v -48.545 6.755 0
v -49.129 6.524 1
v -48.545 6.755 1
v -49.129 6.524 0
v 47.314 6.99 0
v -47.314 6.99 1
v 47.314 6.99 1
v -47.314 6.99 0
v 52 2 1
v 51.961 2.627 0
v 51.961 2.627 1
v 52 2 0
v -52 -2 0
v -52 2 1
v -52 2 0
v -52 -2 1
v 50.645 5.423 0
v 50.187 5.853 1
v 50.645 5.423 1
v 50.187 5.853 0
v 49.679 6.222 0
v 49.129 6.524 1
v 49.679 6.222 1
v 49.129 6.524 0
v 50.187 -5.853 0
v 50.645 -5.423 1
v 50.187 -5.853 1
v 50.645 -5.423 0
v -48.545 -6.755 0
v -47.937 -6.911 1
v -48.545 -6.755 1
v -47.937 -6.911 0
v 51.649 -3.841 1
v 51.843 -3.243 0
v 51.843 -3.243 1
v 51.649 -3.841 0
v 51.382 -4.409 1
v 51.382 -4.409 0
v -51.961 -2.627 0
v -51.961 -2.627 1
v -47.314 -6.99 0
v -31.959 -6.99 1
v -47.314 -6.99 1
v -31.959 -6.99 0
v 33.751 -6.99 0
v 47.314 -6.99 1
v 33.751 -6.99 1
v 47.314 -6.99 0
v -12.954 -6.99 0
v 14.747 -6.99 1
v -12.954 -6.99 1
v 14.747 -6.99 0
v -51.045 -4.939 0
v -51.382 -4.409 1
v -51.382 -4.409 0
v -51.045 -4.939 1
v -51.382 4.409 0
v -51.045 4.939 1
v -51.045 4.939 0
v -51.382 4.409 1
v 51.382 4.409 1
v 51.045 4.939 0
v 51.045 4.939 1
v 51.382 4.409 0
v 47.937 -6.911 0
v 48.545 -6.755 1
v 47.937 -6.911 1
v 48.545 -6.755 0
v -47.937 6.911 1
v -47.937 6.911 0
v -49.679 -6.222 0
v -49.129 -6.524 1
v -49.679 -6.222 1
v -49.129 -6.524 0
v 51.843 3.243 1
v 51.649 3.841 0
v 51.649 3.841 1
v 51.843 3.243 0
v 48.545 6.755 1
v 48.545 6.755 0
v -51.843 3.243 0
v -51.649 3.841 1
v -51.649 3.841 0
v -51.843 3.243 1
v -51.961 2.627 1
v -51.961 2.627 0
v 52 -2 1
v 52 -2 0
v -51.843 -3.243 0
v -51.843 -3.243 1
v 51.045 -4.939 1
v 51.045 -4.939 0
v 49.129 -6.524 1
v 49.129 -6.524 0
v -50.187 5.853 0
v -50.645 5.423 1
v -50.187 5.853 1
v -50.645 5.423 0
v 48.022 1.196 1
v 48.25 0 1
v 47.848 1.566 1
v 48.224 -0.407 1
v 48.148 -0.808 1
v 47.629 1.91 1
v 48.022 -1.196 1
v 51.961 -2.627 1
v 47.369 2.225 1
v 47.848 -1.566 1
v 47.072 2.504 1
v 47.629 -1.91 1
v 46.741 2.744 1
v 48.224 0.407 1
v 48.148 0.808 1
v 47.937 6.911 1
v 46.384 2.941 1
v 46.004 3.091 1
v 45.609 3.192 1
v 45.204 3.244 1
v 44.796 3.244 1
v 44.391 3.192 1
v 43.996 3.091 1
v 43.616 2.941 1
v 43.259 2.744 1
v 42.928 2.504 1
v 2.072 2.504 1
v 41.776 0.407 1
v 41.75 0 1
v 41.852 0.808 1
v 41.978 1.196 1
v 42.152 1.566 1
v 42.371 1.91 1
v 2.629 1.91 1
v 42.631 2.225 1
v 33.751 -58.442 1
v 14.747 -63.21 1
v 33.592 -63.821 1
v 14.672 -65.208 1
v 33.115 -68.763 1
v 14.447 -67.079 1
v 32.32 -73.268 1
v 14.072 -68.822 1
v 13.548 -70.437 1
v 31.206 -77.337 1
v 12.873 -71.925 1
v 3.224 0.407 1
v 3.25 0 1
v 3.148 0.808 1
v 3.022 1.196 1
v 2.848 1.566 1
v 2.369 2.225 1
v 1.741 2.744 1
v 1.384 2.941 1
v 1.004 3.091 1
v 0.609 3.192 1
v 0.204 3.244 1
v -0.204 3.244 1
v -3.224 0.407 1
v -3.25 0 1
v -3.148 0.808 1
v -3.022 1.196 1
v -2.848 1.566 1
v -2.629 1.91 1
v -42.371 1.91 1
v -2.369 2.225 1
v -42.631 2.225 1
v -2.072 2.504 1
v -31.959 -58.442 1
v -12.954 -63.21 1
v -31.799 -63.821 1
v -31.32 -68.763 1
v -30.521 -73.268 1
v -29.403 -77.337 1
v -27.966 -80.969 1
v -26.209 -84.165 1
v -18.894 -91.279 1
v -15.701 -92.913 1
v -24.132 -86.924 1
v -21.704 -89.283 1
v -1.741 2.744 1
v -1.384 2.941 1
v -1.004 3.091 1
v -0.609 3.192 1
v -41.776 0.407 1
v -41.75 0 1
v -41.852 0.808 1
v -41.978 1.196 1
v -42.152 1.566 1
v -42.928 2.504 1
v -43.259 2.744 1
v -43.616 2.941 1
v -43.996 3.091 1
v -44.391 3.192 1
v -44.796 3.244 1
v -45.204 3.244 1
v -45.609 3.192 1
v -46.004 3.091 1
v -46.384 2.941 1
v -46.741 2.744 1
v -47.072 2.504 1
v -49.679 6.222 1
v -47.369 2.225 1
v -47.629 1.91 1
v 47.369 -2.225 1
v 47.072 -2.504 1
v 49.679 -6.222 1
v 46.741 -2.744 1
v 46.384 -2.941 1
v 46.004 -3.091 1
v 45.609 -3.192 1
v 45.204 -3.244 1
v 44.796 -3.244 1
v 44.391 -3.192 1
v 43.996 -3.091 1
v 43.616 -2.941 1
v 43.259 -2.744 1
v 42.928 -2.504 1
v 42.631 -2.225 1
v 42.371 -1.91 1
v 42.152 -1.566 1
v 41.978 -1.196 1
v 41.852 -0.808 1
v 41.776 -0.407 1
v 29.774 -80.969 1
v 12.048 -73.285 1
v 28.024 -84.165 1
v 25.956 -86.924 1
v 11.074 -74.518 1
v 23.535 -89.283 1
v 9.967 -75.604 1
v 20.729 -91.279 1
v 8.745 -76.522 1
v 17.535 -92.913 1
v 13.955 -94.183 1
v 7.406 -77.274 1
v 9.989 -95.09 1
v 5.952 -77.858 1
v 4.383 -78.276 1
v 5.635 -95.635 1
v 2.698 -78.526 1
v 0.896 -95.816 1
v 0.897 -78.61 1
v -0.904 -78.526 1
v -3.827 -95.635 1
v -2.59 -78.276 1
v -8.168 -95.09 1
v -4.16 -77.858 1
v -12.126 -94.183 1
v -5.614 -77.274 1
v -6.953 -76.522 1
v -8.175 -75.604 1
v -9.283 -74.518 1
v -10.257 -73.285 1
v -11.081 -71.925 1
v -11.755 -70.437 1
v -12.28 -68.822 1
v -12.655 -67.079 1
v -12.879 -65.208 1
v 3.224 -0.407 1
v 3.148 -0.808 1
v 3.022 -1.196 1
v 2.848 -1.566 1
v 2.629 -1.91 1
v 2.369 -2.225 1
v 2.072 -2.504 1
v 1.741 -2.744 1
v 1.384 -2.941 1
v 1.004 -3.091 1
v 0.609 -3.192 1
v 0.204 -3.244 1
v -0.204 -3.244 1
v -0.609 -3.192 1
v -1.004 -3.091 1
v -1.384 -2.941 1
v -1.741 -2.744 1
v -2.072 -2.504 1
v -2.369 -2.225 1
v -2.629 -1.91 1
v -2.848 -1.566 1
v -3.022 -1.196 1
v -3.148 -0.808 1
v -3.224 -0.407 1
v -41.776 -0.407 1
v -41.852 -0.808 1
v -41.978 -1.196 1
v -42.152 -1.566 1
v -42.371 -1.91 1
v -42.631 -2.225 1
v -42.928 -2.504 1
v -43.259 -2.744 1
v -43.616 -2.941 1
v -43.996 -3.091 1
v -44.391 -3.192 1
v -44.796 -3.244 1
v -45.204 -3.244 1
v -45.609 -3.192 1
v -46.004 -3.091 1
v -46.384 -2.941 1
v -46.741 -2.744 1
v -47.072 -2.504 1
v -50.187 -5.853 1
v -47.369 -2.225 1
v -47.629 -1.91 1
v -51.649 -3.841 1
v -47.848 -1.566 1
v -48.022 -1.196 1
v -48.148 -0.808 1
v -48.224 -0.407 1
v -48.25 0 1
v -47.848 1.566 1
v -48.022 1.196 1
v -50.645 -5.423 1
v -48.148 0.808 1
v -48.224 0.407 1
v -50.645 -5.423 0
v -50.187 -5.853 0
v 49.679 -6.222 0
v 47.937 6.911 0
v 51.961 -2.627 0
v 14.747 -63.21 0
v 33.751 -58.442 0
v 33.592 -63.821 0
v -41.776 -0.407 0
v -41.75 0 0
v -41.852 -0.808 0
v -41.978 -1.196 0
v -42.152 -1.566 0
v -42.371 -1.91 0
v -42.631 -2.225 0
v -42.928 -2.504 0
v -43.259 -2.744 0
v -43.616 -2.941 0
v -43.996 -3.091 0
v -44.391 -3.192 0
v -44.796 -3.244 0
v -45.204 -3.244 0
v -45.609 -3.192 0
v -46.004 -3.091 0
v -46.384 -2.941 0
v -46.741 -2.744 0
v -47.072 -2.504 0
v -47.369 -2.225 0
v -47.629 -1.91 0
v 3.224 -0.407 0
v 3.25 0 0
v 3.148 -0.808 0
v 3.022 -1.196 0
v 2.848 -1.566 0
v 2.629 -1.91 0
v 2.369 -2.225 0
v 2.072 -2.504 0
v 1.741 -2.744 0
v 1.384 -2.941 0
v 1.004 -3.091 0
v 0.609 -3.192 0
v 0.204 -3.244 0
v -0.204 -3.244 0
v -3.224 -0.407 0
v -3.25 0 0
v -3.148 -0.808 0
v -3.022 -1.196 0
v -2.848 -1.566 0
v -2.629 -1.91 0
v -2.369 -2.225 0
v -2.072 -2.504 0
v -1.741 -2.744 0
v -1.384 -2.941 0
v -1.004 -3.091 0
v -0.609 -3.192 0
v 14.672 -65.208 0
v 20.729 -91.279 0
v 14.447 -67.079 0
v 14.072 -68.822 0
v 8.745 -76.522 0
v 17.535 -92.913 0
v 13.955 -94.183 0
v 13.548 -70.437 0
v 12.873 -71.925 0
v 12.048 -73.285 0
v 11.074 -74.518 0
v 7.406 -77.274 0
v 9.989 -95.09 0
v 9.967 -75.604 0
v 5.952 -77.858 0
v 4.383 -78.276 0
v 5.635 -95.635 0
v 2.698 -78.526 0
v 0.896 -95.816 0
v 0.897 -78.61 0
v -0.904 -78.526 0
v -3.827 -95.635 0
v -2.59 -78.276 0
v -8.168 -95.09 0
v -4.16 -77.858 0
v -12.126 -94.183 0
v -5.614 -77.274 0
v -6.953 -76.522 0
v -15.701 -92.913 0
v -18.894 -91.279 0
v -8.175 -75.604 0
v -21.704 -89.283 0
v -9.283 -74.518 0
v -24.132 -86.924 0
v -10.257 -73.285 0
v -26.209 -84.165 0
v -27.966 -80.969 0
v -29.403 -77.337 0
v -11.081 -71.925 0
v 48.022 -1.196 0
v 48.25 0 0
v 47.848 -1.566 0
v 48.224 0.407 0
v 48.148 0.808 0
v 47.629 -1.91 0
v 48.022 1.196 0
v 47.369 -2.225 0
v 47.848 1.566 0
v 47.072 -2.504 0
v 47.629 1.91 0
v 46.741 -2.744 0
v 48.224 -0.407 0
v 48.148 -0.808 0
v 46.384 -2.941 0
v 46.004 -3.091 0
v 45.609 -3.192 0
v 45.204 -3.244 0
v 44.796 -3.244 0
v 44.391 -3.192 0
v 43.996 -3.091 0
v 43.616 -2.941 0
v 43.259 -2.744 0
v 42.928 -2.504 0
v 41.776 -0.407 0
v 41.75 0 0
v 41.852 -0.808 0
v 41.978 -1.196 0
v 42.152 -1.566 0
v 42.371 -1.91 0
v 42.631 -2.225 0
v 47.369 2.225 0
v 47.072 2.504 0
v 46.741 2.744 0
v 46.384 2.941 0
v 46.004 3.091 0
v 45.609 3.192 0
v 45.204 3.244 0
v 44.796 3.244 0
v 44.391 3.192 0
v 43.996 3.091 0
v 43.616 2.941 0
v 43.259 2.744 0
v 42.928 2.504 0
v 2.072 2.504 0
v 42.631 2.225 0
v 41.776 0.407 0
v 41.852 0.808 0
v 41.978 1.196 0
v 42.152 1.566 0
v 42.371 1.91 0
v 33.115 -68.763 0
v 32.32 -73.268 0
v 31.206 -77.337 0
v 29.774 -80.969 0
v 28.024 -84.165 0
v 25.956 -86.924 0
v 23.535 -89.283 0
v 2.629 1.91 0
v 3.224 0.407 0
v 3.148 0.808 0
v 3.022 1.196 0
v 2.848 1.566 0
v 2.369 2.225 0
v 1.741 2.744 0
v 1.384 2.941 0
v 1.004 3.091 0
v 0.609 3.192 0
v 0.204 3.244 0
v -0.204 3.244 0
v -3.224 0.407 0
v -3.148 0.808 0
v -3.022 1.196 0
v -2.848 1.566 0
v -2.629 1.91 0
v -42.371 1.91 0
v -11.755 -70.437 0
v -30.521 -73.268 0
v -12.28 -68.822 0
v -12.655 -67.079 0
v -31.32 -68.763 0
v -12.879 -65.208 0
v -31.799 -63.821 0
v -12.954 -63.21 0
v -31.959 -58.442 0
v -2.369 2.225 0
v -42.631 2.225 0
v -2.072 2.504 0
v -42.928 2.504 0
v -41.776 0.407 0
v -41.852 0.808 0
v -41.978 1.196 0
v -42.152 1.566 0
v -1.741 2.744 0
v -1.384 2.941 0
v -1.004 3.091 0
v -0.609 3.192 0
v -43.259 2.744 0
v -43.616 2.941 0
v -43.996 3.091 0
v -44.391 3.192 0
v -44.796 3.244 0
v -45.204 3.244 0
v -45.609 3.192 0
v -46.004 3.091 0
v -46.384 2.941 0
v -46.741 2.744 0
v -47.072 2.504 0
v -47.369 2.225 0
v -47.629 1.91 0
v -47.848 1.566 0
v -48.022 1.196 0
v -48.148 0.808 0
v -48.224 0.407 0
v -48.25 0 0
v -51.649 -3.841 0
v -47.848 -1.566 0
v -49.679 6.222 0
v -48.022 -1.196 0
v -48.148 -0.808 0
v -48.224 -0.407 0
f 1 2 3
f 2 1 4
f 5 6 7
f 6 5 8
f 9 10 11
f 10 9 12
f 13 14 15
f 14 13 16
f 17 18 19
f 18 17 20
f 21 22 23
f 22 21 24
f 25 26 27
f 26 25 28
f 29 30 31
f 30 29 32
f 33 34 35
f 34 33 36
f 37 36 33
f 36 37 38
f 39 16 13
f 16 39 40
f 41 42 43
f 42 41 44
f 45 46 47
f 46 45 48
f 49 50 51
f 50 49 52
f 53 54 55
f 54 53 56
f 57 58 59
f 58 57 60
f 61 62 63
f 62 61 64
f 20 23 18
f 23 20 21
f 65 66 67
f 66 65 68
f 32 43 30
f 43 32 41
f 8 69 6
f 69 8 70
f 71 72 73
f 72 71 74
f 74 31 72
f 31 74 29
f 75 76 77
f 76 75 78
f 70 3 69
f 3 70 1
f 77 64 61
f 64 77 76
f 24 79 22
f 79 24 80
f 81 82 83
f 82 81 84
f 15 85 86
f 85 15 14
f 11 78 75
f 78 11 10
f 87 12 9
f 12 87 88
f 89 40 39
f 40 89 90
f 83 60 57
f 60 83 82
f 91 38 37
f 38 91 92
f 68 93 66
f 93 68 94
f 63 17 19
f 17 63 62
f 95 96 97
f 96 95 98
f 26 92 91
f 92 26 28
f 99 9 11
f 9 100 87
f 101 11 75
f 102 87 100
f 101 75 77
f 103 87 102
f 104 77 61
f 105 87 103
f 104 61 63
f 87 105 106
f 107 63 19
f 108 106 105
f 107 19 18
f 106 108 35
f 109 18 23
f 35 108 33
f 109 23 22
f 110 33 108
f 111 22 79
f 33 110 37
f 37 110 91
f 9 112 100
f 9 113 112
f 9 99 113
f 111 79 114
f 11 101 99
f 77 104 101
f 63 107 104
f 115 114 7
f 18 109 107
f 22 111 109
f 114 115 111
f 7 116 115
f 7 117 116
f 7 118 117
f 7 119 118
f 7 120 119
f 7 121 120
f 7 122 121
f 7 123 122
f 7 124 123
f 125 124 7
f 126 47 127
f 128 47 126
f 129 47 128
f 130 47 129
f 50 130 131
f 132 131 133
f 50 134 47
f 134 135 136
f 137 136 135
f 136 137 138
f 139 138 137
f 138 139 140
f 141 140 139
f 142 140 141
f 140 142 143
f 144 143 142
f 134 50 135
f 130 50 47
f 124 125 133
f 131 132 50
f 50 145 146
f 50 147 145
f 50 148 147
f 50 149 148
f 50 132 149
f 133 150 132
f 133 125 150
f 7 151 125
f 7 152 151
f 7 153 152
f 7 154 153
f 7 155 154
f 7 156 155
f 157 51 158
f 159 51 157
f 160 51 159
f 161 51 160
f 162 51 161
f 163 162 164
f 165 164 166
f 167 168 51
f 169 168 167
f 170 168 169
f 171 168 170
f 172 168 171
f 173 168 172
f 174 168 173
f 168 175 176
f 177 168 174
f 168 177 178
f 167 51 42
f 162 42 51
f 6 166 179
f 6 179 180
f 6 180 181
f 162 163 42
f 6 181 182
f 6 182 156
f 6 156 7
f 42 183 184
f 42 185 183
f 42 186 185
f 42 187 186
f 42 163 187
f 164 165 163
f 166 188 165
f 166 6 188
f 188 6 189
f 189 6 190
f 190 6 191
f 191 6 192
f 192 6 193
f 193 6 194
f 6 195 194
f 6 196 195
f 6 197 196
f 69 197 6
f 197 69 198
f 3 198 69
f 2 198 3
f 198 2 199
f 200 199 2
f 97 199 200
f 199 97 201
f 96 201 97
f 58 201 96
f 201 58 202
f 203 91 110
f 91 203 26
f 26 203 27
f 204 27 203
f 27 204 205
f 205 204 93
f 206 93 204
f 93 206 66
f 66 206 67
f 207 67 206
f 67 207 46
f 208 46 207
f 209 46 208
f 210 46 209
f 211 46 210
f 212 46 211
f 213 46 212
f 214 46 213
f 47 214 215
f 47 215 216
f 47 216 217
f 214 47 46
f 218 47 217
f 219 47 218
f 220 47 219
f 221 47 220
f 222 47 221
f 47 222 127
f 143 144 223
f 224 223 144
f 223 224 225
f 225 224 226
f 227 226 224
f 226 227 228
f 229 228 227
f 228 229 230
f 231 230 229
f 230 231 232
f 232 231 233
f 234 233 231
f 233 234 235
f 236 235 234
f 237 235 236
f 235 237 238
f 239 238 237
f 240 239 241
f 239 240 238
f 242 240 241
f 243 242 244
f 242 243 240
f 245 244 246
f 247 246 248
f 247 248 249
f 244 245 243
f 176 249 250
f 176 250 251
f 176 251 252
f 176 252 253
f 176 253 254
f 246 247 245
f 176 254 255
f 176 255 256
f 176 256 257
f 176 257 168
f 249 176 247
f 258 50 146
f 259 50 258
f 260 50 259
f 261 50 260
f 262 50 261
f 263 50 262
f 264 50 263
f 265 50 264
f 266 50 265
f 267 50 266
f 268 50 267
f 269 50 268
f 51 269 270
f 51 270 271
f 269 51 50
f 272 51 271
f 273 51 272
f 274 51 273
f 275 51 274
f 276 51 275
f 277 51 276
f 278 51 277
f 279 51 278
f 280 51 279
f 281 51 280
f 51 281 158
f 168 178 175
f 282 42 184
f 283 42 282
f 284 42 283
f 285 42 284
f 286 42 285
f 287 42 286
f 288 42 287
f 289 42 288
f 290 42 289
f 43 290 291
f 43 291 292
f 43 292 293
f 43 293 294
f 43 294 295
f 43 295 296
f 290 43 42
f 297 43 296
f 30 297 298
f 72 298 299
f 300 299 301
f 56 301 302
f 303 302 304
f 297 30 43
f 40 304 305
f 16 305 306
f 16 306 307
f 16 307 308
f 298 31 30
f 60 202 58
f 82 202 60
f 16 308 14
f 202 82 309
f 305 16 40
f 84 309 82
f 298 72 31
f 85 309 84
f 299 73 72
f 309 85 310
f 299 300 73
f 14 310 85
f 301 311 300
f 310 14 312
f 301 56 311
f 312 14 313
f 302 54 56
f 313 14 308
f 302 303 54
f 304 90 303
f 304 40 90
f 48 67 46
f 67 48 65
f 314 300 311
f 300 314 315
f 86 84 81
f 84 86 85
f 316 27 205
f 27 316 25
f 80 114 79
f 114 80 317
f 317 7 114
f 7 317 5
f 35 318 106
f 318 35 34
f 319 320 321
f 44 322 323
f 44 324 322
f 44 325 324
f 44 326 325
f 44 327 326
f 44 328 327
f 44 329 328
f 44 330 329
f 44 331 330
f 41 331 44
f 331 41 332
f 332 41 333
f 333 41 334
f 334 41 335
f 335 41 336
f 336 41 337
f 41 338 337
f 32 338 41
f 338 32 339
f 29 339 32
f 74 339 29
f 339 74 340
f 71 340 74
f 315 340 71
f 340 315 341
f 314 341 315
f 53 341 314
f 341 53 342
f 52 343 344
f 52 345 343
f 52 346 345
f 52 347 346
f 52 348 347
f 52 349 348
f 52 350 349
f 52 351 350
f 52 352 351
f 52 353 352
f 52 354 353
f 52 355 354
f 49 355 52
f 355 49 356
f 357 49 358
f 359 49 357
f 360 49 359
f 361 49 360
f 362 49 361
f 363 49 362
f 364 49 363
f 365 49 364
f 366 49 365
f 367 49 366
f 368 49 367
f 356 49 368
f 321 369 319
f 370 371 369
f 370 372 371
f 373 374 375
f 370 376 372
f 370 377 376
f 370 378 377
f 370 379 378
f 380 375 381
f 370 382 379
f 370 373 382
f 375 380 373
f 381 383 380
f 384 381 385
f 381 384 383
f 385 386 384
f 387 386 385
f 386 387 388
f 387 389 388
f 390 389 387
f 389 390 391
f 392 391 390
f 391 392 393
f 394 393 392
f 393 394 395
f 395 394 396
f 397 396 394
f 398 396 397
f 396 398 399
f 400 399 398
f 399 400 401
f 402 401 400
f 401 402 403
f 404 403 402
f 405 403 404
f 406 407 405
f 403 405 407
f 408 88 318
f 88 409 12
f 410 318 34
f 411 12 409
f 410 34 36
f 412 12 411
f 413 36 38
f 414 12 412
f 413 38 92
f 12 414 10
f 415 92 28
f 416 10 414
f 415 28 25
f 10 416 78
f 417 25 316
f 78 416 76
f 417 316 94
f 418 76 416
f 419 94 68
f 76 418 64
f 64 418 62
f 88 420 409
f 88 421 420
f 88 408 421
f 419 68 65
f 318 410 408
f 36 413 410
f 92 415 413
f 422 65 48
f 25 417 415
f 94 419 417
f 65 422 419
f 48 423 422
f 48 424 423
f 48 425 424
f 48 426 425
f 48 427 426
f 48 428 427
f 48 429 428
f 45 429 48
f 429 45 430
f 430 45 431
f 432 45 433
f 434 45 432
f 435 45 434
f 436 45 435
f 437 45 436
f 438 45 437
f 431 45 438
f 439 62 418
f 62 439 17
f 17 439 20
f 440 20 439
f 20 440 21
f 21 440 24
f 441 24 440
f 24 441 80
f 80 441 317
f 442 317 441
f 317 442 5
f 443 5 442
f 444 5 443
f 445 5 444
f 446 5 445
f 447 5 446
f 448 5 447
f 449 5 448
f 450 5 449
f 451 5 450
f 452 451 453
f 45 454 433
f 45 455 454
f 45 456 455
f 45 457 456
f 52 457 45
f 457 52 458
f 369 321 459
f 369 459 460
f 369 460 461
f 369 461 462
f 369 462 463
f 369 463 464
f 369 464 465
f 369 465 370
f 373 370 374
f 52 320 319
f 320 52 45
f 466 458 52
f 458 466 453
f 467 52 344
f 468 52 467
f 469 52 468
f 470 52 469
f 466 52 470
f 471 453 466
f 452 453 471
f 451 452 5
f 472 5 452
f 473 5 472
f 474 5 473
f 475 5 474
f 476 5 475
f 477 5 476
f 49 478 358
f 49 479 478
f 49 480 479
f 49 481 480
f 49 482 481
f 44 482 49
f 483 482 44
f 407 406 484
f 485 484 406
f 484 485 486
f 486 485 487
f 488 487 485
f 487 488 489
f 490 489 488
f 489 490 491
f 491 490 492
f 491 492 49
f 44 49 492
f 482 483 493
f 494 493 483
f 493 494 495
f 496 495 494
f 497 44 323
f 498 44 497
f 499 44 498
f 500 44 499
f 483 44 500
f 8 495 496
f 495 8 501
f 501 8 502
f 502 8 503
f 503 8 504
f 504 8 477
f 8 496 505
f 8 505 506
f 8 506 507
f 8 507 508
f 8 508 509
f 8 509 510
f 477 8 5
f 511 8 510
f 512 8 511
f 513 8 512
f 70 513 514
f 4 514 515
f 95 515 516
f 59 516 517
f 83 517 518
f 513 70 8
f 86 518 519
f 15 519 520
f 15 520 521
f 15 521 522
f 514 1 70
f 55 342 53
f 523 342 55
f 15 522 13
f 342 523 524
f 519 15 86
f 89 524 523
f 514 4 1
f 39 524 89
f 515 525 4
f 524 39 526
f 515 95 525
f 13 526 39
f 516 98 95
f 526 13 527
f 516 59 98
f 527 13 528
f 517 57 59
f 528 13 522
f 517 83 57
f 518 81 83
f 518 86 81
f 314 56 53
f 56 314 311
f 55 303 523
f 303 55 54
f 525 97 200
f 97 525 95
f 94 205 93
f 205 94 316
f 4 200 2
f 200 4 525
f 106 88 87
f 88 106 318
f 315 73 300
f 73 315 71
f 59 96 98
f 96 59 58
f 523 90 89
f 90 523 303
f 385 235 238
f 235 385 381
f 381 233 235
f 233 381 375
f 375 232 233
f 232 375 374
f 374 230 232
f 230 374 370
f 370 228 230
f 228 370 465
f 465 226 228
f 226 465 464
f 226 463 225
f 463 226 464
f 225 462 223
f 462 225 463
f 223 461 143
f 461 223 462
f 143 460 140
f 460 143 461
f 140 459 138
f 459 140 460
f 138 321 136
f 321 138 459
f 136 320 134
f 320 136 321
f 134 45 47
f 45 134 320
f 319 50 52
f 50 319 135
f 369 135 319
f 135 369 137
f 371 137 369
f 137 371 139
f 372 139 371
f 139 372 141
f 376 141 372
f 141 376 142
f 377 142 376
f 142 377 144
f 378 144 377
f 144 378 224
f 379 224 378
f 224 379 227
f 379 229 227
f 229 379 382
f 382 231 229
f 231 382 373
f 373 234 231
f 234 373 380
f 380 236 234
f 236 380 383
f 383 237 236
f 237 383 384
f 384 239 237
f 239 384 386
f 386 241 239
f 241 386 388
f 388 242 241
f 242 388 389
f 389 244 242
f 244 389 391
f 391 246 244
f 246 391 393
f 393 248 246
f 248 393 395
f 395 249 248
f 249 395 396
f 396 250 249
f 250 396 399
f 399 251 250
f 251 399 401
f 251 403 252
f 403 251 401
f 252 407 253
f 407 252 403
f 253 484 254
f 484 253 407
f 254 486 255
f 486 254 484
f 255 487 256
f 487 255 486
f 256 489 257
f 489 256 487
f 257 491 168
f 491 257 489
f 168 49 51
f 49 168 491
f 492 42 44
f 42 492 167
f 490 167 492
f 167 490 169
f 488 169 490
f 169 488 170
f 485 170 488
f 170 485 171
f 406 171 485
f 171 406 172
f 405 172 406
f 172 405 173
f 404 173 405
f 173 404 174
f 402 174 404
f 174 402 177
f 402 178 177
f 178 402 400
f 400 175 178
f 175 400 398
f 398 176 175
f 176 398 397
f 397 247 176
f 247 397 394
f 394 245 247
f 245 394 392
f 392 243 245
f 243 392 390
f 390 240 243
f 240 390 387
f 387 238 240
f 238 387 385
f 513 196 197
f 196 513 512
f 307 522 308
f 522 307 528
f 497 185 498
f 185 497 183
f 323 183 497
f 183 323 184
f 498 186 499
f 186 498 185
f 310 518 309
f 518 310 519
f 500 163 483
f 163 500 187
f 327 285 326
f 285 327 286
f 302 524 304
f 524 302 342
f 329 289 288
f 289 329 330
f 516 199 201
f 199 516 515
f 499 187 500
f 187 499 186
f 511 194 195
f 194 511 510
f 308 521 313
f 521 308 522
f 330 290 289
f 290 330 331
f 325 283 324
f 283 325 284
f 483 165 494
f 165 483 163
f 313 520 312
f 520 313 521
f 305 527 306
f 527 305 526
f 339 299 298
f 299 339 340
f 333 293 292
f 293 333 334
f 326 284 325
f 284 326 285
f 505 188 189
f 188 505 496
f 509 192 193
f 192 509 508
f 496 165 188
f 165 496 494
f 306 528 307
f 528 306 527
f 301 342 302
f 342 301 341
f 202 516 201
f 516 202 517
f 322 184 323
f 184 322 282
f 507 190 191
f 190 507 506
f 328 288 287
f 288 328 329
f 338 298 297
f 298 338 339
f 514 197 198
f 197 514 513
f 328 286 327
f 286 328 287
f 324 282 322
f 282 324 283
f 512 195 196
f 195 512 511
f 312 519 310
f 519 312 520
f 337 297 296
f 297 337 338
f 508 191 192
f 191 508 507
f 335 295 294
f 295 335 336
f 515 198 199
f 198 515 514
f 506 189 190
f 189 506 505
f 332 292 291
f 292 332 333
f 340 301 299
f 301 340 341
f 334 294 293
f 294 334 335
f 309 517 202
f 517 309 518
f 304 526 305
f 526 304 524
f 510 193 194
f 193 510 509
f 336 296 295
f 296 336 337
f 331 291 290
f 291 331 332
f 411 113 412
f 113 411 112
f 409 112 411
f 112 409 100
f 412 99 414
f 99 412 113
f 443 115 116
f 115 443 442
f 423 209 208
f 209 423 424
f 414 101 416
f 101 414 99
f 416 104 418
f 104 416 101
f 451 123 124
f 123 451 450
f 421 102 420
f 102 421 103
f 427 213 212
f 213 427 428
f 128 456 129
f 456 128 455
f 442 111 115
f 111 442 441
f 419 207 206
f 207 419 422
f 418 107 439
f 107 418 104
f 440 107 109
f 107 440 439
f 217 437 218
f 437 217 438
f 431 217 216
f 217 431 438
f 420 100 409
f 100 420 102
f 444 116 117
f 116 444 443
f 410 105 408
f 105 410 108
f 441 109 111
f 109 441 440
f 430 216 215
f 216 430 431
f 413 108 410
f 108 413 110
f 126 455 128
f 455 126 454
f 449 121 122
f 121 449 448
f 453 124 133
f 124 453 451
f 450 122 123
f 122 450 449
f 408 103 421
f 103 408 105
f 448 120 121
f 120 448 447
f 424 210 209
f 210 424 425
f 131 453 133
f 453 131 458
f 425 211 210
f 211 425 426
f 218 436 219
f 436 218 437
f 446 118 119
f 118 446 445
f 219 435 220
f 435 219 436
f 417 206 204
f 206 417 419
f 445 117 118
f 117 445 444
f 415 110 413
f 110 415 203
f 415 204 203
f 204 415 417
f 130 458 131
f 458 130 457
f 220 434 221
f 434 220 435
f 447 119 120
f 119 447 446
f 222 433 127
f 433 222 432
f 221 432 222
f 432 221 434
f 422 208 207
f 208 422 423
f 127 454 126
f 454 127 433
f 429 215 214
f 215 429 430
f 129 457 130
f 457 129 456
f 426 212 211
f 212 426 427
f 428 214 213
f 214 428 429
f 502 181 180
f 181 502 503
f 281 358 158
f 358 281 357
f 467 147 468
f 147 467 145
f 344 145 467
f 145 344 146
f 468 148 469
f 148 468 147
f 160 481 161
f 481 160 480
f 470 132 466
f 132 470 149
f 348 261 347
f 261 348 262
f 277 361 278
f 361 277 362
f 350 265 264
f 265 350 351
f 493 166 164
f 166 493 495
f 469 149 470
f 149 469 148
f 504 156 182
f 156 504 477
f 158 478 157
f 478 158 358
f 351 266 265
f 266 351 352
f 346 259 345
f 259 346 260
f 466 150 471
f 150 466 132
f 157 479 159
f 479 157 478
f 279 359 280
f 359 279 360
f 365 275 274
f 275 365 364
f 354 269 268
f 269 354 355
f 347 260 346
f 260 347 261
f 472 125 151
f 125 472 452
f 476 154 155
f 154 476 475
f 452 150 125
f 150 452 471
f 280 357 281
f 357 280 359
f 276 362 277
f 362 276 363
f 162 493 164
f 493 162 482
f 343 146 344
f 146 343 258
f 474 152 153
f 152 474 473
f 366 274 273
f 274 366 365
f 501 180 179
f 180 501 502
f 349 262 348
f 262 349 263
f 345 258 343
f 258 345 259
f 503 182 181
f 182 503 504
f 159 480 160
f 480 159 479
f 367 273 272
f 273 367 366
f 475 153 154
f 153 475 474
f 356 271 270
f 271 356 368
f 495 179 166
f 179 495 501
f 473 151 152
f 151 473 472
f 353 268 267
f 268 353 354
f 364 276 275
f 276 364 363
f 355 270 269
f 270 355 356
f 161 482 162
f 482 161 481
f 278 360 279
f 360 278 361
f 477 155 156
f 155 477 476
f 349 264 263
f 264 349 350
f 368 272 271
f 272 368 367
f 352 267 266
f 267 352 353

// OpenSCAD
$fn = 50;


difference() {
	union() {
		translate(v = [0, 0, 0]) {
			rotate(a = [0, 0, 0]) {
				hull() {
					translate(v = [-47.0000000000, 2.0000000000, 0]) {
						rotate(a = [0, 0, 0]) {
							translate(v = [0, 0, 0]) {
								rotate(a = [0, 0, 0]) {
									cylinder(h = 1, r = 5);
								}
							}
						}
					}
					translate(v = [47.0000000000, 2.0000000000, 0]) {
						rotate(a = [0, 0, 0]) {
							translate(v = [0, 0, 0]) {
								rotate(a = [0, 0, 0]) {
									cylinder(h = 1, r = 5);
								}
							}
						}
					}
					translate(v = [-47.0000000000, -2.0000000000, 0]) {
						rotate(a = [0, 0, 0]) {
							translate(v = [0, 0, 0]) {
								rotate(a = [0, 0, 0]) {
									cylinder(h = 1, r = 5);
								}
							}
						}
					}
					translate(v = [47.0000000000, -2.0000000000, 0]) {
						rotate(a = [0, 0, 0]) {
							translate(v = [0, 0, 0]) {
								rotate(a = [0, 0, 0]) {
									cylinder(h = 1, r = 5);
								}
							}
						}
					}
				}
			}
		}
		translate(v = [0, 0, 0]) {
			rotate(a = [0, 0, 0]) {
				linear_extrude(height = 1) {
					text(font = "DejaVu Sans Mono:style=Bold", halign = "center", size = 95, text = "U", valign = "top");
				}
			}
		}
	}
	union() {
		translate(v = [-45.0000000000, 0.0000000000, -125.0000000000]) {
			rotate(a = [0, 0, 0]) {
				cylinder(h = 250, r = 3.2500000000);
			}
		}
		translate(v = [45.0000000000, 0.0000000000, -125.0000000000]) {
			rotate(a = [0, 0, 0]) {
				cylinder(h = 250, r = 3.2500000000);
			}
		}
		translate(v = [45.0000000000, 0.0000000000, -125.0000000000]) {
			rotate(a = [0, 0, 0]) {
				cylinder(h = 250, r = 3.2500000000);
			}
		}
		translate(v = [0, 0, -125.0000000000]) {
			rotate(a = [0, 0, 0]) {
				cylinder(h = 250, r = 3.2500000000);
			}
		}
	}
}
